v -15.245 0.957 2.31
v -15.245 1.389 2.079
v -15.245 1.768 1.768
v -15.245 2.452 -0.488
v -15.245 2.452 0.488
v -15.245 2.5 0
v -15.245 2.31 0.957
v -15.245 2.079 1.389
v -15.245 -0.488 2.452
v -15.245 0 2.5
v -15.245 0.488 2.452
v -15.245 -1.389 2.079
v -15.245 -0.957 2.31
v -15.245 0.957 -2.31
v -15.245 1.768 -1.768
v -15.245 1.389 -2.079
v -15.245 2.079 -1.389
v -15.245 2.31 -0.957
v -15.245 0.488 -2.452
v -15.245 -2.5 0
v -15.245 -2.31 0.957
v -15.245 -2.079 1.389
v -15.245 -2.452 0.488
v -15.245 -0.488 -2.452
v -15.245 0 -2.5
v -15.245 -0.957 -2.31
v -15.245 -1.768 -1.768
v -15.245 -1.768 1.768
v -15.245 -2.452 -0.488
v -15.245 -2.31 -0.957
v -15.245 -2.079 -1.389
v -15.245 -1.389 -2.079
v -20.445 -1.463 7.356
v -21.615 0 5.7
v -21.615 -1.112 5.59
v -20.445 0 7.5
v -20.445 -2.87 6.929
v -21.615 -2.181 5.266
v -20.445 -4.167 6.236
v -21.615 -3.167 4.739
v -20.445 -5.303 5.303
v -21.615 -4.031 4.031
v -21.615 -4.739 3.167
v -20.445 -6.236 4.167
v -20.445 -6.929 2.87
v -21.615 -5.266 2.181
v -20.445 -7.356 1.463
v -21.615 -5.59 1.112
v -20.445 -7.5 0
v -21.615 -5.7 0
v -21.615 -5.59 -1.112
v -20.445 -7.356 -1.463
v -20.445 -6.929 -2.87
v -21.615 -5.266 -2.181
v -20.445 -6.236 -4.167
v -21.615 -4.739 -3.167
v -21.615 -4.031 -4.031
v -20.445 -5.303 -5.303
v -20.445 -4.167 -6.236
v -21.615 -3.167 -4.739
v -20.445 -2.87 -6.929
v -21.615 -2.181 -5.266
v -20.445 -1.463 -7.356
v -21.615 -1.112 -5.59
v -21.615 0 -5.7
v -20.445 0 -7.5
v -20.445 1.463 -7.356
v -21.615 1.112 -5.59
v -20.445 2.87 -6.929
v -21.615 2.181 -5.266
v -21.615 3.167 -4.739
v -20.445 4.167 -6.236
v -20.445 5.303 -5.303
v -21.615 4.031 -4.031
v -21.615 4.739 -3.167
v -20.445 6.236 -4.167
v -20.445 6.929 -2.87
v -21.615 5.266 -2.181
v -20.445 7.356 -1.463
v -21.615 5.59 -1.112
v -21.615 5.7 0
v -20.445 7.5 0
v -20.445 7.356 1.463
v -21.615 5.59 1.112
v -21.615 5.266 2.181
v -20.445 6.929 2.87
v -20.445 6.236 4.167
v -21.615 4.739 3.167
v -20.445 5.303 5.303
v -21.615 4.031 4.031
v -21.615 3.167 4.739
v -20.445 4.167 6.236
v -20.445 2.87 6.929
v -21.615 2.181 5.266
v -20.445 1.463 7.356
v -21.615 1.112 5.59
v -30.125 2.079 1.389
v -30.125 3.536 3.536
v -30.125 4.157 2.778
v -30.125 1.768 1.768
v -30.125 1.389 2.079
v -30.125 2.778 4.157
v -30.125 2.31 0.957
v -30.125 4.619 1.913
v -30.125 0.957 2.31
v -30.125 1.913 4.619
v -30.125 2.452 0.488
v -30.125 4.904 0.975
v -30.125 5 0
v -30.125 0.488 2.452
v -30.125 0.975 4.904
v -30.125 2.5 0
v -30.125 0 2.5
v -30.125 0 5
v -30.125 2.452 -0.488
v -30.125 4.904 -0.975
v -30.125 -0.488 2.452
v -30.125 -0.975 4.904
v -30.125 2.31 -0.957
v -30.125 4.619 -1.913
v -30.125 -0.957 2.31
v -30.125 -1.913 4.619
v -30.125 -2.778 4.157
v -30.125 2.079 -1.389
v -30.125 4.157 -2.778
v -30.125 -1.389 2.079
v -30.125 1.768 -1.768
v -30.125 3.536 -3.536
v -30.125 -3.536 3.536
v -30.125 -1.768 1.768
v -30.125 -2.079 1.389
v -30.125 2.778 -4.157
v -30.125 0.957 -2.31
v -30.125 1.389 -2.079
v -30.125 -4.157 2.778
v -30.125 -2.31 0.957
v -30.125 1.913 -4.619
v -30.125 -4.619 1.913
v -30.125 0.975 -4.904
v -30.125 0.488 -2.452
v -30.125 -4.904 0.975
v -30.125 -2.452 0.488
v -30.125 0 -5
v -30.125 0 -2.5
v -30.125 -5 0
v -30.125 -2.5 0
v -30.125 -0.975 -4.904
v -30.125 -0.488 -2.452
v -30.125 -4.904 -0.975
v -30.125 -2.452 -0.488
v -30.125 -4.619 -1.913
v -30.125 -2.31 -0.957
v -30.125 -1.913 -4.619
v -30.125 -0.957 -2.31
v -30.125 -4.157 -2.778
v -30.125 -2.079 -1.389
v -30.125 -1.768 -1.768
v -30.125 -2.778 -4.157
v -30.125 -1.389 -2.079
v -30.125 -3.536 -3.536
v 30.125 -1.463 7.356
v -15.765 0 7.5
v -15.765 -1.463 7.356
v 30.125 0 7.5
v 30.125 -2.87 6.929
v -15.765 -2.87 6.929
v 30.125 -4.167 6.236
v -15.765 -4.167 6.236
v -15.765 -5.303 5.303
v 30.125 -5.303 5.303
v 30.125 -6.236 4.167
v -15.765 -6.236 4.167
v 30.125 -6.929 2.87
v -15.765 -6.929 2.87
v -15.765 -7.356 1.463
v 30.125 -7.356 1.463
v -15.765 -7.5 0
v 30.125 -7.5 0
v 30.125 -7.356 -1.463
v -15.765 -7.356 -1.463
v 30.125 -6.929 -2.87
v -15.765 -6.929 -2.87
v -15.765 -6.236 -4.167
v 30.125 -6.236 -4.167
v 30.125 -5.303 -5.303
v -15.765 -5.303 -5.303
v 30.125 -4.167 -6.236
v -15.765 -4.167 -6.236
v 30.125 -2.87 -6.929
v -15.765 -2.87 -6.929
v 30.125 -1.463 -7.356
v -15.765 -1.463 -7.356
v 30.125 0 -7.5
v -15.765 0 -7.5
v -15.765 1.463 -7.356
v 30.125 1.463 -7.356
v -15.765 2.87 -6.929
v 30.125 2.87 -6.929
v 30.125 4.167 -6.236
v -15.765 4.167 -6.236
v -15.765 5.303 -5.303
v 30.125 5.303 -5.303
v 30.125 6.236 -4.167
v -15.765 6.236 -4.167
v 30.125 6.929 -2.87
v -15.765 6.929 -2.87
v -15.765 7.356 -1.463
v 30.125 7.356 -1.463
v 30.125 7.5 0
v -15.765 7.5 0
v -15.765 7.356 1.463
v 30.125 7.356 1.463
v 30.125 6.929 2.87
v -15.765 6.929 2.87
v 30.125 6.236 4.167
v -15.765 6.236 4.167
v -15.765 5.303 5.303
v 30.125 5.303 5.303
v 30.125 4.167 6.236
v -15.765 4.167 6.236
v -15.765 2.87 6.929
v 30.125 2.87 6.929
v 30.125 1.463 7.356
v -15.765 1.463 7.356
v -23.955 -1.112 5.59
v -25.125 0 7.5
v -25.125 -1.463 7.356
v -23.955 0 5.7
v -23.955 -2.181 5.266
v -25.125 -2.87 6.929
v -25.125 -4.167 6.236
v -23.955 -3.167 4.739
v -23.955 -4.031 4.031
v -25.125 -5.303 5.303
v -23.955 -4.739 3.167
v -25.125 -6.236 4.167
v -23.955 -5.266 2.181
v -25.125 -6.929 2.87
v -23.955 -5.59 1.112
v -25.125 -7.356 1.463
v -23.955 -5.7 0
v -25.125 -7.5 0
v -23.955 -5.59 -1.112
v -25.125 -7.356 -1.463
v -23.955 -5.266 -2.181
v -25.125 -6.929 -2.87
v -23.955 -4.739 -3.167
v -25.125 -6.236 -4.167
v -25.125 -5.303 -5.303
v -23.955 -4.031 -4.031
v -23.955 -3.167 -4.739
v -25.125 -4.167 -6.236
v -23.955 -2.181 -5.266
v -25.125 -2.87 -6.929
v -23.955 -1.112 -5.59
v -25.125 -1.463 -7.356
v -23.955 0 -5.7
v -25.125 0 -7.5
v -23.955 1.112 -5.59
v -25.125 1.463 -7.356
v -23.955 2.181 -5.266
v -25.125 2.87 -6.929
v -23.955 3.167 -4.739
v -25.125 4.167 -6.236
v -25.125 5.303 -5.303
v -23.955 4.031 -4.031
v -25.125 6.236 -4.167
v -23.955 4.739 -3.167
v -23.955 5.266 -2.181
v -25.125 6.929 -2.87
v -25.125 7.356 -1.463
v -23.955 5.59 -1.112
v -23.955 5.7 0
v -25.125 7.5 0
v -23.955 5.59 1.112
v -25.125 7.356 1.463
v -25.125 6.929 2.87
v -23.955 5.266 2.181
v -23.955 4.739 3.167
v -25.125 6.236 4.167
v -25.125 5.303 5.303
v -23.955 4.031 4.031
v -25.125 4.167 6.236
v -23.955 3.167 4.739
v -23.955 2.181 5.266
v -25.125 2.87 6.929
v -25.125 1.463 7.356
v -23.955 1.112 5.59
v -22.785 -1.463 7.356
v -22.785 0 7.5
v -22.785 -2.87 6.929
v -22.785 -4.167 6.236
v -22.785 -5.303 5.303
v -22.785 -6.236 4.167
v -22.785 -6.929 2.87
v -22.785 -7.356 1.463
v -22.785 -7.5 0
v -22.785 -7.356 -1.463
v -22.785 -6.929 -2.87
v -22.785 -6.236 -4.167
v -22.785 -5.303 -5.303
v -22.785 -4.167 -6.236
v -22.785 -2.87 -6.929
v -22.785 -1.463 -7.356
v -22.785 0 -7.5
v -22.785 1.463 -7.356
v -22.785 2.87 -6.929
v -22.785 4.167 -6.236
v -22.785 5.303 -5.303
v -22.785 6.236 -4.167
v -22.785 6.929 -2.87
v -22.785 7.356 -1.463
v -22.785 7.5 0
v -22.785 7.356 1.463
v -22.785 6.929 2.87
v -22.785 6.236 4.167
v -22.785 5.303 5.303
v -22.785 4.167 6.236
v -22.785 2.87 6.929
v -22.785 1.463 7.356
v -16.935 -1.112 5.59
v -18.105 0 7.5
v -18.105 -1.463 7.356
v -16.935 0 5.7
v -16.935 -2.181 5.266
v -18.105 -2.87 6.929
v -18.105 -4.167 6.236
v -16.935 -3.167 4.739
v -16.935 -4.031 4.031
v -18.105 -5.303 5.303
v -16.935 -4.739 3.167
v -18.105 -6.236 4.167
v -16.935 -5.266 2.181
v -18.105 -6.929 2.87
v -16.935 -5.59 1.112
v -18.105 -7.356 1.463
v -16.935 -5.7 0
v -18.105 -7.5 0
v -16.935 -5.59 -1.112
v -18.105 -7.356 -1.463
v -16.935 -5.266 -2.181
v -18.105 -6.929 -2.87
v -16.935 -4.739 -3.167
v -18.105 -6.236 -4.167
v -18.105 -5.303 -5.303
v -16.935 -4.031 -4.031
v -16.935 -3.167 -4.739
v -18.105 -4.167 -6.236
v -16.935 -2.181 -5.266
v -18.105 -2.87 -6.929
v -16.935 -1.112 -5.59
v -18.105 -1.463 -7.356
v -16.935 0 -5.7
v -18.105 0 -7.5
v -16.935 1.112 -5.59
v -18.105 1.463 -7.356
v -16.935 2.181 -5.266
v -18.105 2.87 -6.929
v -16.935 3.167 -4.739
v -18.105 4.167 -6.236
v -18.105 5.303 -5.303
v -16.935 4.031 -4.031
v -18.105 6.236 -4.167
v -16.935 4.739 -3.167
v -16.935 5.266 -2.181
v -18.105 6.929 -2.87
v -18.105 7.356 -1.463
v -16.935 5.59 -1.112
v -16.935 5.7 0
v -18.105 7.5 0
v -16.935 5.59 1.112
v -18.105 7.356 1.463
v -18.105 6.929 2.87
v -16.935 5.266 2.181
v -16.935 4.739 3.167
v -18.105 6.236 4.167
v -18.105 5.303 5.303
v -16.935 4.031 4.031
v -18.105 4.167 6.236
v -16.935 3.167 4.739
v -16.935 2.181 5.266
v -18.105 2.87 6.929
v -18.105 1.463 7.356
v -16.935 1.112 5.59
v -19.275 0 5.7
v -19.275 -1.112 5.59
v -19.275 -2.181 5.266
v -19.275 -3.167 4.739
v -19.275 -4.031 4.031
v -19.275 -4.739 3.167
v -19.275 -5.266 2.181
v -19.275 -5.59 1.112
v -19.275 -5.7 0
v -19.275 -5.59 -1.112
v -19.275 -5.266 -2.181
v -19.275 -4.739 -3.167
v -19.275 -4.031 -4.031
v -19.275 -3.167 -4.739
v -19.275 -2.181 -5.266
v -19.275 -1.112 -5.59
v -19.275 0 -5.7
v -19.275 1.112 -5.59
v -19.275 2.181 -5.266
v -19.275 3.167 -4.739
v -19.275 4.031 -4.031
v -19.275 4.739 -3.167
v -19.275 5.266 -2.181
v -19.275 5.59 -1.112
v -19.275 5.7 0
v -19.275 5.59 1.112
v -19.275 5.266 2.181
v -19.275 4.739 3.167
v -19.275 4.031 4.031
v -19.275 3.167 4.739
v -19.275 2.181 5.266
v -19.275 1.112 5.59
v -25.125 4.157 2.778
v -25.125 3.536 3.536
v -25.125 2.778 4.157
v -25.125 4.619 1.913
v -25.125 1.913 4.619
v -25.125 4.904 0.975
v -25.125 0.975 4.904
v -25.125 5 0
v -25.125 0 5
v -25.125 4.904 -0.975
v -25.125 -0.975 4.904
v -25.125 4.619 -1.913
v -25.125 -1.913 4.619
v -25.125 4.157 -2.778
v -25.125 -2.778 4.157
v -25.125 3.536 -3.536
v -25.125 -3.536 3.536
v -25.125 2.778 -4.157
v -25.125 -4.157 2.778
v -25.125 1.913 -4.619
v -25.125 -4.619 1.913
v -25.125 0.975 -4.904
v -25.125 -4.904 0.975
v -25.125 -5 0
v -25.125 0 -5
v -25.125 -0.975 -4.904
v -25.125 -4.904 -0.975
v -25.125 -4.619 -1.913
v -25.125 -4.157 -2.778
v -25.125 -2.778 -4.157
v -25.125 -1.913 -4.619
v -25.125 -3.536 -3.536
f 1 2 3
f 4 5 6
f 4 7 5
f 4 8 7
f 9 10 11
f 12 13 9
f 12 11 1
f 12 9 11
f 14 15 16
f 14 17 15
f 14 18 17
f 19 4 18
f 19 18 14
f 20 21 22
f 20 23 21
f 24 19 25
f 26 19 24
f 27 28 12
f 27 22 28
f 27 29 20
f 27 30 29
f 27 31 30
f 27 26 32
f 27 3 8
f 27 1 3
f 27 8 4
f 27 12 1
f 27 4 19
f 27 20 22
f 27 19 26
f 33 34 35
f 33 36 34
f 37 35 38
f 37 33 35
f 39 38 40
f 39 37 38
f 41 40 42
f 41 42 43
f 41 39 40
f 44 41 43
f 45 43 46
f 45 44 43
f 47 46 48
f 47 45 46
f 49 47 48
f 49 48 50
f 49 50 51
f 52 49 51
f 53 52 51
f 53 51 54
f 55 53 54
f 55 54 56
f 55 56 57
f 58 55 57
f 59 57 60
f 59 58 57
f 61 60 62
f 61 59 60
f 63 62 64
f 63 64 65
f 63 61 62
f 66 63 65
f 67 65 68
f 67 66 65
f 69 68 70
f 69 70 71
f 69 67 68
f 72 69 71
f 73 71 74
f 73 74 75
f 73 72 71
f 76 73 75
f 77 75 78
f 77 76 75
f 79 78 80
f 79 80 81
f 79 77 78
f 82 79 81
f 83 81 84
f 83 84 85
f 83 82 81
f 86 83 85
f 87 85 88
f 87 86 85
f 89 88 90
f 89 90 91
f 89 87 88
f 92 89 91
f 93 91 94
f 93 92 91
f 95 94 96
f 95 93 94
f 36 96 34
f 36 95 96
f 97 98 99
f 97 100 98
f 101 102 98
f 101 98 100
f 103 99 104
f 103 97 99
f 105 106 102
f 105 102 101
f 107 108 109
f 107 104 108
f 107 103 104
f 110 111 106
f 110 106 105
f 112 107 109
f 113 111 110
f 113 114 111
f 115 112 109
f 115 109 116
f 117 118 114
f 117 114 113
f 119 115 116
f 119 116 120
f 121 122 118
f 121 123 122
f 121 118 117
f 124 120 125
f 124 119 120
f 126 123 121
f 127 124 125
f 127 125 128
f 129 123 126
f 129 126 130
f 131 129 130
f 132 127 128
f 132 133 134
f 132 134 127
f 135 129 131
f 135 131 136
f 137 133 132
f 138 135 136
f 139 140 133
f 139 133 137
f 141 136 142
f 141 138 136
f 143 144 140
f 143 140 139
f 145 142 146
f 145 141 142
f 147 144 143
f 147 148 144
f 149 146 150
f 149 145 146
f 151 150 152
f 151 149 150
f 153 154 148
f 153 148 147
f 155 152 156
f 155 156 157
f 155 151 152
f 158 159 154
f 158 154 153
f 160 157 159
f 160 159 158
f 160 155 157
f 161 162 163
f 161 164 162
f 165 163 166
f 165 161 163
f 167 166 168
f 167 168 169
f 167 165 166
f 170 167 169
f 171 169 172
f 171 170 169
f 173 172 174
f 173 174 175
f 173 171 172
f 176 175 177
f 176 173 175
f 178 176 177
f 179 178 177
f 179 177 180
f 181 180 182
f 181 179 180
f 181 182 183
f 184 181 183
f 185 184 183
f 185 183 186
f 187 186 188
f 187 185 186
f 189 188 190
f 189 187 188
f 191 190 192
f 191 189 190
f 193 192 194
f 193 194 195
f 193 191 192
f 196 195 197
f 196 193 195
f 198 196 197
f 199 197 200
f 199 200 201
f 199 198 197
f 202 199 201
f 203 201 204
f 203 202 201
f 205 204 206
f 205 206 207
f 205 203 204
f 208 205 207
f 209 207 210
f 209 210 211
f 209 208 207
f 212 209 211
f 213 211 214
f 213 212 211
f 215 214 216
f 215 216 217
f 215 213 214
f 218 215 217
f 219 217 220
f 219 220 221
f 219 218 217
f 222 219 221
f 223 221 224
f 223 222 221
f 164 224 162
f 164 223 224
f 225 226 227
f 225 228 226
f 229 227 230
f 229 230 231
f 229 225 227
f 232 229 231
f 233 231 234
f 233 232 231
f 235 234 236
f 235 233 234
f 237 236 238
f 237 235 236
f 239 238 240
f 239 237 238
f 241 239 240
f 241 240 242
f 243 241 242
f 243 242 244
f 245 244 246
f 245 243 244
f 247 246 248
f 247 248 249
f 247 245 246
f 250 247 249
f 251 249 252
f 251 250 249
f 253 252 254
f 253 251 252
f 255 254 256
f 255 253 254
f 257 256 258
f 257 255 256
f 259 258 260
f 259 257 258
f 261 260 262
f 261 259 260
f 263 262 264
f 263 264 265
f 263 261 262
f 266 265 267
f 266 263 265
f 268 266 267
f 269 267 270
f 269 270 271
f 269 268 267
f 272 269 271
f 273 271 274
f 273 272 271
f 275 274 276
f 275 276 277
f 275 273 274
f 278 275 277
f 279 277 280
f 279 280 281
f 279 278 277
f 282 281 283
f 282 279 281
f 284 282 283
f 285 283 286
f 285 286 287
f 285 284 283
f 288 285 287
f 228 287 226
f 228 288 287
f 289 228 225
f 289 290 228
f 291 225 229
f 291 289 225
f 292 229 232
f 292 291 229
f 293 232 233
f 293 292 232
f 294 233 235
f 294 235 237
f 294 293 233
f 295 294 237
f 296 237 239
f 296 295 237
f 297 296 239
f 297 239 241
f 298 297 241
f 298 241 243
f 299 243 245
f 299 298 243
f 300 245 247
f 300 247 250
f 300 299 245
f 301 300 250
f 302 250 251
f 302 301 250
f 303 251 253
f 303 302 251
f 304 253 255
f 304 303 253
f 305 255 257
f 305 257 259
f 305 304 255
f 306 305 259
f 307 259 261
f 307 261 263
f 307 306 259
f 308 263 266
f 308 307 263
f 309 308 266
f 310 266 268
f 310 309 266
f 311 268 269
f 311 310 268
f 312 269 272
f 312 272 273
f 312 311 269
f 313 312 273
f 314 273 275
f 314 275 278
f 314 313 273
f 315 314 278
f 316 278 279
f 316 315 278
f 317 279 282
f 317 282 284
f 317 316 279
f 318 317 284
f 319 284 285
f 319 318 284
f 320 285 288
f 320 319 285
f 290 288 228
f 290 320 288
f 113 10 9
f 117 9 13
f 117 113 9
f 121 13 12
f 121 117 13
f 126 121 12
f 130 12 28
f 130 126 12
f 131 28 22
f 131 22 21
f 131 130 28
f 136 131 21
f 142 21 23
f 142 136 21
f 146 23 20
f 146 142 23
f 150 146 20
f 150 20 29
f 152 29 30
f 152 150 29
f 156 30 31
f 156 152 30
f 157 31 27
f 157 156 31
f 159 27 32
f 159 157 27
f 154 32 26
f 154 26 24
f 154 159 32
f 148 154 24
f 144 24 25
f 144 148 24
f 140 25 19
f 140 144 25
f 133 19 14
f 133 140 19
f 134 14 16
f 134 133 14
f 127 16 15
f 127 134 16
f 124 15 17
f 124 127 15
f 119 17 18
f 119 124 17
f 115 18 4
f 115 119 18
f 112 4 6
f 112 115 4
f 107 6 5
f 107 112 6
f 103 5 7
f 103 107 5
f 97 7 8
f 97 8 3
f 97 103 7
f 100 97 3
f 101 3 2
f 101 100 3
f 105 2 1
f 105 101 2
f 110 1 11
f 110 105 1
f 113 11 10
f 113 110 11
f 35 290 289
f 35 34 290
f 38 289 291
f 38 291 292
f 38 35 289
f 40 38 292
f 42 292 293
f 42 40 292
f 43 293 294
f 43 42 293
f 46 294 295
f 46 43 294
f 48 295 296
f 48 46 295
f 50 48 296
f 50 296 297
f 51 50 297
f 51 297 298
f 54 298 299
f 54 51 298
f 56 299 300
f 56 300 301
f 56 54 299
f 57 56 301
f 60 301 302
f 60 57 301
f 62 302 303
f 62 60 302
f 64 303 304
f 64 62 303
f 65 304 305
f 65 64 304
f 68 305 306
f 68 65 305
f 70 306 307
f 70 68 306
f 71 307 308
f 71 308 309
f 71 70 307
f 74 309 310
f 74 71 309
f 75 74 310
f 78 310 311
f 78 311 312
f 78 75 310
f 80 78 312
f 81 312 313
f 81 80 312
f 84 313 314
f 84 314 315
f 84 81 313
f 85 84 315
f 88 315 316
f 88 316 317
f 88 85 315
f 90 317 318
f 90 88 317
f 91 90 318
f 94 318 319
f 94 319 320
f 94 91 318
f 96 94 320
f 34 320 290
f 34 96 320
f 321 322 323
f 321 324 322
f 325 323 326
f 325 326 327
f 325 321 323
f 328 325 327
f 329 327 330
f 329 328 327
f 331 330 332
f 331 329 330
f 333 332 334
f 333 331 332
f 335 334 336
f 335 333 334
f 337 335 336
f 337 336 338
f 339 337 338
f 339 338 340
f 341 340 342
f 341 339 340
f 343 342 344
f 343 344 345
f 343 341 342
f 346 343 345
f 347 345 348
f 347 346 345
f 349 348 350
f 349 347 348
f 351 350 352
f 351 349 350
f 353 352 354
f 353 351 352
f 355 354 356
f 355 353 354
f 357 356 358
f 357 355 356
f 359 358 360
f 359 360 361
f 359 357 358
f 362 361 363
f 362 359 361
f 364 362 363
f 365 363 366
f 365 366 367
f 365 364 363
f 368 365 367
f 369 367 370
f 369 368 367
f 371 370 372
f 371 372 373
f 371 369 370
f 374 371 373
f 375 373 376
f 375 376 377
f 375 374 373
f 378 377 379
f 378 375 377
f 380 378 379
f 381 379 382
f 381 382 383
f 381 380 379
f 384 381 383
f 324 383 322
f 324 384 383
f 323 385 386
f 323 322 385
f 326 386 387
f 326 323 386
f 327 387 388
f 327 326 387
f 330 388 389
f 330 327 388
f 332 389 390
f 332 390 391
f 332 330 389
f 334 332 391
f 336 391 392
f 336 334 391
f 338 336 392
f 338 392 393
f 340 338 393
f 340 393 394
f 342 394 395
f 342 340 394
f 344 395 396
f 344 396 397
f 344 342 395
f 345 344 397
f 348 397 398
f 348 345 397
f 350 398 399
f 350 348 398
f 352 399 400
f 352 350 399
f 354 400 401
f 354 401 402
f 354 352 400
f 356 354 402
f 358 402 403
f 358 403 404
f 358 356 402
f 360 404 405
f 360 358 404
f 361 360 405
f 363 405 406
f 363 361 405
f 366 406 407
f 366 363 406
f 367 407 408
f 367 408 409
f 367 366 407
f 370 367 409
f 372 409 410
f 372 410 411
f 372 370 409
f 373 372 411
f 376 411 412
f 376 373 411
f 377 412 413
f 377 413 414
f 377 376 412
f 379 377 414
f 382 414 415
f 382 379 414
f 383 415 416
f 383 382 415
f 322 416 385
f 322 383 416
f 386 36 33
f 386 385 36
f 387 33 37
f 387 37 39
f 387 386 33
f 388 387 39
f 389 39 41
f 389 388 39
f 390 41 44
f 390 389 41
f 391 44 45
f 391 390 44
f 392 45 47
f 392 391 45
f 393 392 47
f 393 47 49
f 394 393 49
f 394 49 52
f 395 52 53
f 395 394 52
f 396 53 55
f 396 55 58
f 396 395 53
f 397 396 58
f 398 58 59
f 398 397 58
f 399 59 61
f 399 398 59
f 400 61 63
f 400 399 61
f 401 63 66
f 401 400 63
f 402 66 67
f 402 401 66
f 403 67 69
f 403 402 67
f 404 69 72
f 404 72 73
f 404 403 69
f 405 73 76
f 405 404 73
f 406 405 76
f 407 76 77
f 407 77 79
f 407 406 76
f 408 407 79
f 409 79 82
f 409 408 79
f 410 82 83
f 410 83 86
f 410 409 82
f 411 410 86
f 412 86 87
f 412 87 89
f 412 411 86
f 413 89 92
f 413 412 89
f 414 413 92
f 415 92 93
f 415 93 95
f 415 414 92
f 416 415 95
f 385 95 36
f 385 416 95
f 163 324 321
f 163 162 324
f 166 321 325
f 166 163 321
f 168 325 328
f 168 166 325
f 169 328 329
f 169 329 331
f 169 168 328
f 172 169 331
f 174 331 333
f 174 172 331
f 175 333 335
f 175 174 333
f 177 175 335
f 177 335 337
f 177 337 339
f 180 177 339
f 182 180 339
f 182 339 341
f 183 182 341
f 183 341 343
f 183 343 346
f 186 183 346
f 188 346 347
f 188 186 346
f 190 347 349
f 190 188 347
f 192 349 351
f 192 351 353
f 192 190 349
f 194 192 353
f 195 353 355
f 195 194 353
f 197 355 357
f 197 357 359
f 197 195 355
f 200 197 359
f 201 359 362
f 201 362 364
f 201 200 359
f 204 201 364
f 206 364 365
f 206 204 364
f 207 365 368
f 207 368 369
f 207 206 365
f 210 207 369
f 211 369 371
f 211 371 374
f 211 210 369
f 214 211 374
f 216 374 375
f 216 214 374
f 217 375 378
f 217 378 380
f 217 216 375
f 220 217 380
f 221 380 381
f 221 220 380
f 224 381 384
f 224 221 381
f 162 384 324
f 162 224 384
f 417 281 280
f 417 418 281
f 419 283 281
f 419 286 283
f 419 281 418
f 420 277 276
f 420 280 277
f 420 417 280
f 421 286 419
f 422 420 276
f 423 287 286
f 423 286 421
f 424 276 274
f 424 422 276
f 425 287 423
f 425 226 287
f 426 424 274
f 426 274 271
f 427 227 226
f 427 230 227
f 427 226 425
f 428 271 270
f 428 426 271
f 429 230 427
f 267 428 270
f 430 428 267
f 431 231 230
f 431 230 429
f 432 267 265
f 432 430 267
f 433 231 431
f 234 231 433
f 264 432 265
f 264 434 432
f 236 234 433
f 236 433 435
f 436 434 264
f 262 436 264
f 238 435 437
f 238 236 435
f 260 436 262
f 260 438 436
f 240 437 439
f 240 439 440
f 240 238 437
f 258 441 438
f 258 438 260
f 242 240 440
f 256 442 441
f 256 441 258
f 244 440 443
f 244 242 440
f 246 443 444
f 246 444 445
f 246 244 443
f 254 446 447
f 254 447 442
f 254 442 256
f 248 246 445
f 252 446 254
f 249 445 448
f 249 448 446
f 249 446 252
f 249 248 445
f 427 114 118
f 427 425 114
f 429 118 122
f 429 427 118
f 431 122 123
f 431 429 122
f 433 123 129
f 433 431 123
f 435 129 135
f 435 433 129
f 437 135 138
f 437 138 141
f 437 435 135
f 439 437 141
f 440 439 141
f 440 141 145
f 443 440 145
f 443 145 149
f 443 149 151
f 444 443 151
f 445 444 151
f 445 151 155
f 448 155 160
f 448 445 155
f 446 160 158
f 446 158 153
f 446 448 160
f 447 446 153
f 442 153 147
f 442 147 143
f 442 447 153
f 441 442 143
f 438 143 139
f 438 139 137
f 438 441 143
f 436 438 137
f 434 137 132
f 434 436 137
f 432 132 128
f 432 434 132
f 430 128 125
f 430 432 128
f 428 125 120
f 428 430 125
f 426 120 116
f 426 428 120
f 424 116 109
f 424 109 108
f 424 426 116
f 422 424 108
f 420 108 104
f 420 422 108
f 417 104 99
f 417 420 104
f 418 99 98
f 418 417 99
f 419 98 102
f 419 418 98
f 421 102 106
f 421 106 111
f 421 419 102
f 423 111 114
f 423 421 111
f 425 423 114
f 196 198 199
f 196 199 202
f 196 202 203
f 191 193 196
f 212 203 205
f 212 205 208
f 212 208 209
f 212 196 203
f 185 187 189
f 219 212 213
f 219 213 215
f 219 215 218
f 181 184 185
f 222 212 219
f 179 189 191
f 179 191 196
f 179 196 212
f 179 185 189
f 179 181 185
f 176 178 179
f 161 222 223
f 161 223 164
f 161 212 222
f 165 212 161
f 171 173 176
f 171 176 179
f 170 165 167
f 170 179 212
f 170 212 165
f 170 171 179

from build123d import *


with BuildPart() as part:
    # Esboço1 → Revolução1 (revolve)
    with BuildSketch(Plane.XY, mode=Mode.PRIVATE) as revolu_o1_sk:
        Polygon((-15.245, 0), (-15.245, 2.5), (-30.125, 2.5), (-30.125, 5), (-25.125, 5), (-25.125, 7.5), (-23.955, 5.7), (-22.785, 7.5), (-21.615, 5.7), (-20.445, 7.5), (-19.275, 5.7), (-18.105, 7.5), (-16.935, 5.7), (-15.765, 7.5), (30.125, 7.5), (30.125, 0), align=None)
    revolve(revolu_o1_sk.sketch.rotate(Axis((0, 0, 0), (1, 0, 0)), 90), axis=Axis((0, 0, 0), (1, 0, 0)))


solid = part.part
